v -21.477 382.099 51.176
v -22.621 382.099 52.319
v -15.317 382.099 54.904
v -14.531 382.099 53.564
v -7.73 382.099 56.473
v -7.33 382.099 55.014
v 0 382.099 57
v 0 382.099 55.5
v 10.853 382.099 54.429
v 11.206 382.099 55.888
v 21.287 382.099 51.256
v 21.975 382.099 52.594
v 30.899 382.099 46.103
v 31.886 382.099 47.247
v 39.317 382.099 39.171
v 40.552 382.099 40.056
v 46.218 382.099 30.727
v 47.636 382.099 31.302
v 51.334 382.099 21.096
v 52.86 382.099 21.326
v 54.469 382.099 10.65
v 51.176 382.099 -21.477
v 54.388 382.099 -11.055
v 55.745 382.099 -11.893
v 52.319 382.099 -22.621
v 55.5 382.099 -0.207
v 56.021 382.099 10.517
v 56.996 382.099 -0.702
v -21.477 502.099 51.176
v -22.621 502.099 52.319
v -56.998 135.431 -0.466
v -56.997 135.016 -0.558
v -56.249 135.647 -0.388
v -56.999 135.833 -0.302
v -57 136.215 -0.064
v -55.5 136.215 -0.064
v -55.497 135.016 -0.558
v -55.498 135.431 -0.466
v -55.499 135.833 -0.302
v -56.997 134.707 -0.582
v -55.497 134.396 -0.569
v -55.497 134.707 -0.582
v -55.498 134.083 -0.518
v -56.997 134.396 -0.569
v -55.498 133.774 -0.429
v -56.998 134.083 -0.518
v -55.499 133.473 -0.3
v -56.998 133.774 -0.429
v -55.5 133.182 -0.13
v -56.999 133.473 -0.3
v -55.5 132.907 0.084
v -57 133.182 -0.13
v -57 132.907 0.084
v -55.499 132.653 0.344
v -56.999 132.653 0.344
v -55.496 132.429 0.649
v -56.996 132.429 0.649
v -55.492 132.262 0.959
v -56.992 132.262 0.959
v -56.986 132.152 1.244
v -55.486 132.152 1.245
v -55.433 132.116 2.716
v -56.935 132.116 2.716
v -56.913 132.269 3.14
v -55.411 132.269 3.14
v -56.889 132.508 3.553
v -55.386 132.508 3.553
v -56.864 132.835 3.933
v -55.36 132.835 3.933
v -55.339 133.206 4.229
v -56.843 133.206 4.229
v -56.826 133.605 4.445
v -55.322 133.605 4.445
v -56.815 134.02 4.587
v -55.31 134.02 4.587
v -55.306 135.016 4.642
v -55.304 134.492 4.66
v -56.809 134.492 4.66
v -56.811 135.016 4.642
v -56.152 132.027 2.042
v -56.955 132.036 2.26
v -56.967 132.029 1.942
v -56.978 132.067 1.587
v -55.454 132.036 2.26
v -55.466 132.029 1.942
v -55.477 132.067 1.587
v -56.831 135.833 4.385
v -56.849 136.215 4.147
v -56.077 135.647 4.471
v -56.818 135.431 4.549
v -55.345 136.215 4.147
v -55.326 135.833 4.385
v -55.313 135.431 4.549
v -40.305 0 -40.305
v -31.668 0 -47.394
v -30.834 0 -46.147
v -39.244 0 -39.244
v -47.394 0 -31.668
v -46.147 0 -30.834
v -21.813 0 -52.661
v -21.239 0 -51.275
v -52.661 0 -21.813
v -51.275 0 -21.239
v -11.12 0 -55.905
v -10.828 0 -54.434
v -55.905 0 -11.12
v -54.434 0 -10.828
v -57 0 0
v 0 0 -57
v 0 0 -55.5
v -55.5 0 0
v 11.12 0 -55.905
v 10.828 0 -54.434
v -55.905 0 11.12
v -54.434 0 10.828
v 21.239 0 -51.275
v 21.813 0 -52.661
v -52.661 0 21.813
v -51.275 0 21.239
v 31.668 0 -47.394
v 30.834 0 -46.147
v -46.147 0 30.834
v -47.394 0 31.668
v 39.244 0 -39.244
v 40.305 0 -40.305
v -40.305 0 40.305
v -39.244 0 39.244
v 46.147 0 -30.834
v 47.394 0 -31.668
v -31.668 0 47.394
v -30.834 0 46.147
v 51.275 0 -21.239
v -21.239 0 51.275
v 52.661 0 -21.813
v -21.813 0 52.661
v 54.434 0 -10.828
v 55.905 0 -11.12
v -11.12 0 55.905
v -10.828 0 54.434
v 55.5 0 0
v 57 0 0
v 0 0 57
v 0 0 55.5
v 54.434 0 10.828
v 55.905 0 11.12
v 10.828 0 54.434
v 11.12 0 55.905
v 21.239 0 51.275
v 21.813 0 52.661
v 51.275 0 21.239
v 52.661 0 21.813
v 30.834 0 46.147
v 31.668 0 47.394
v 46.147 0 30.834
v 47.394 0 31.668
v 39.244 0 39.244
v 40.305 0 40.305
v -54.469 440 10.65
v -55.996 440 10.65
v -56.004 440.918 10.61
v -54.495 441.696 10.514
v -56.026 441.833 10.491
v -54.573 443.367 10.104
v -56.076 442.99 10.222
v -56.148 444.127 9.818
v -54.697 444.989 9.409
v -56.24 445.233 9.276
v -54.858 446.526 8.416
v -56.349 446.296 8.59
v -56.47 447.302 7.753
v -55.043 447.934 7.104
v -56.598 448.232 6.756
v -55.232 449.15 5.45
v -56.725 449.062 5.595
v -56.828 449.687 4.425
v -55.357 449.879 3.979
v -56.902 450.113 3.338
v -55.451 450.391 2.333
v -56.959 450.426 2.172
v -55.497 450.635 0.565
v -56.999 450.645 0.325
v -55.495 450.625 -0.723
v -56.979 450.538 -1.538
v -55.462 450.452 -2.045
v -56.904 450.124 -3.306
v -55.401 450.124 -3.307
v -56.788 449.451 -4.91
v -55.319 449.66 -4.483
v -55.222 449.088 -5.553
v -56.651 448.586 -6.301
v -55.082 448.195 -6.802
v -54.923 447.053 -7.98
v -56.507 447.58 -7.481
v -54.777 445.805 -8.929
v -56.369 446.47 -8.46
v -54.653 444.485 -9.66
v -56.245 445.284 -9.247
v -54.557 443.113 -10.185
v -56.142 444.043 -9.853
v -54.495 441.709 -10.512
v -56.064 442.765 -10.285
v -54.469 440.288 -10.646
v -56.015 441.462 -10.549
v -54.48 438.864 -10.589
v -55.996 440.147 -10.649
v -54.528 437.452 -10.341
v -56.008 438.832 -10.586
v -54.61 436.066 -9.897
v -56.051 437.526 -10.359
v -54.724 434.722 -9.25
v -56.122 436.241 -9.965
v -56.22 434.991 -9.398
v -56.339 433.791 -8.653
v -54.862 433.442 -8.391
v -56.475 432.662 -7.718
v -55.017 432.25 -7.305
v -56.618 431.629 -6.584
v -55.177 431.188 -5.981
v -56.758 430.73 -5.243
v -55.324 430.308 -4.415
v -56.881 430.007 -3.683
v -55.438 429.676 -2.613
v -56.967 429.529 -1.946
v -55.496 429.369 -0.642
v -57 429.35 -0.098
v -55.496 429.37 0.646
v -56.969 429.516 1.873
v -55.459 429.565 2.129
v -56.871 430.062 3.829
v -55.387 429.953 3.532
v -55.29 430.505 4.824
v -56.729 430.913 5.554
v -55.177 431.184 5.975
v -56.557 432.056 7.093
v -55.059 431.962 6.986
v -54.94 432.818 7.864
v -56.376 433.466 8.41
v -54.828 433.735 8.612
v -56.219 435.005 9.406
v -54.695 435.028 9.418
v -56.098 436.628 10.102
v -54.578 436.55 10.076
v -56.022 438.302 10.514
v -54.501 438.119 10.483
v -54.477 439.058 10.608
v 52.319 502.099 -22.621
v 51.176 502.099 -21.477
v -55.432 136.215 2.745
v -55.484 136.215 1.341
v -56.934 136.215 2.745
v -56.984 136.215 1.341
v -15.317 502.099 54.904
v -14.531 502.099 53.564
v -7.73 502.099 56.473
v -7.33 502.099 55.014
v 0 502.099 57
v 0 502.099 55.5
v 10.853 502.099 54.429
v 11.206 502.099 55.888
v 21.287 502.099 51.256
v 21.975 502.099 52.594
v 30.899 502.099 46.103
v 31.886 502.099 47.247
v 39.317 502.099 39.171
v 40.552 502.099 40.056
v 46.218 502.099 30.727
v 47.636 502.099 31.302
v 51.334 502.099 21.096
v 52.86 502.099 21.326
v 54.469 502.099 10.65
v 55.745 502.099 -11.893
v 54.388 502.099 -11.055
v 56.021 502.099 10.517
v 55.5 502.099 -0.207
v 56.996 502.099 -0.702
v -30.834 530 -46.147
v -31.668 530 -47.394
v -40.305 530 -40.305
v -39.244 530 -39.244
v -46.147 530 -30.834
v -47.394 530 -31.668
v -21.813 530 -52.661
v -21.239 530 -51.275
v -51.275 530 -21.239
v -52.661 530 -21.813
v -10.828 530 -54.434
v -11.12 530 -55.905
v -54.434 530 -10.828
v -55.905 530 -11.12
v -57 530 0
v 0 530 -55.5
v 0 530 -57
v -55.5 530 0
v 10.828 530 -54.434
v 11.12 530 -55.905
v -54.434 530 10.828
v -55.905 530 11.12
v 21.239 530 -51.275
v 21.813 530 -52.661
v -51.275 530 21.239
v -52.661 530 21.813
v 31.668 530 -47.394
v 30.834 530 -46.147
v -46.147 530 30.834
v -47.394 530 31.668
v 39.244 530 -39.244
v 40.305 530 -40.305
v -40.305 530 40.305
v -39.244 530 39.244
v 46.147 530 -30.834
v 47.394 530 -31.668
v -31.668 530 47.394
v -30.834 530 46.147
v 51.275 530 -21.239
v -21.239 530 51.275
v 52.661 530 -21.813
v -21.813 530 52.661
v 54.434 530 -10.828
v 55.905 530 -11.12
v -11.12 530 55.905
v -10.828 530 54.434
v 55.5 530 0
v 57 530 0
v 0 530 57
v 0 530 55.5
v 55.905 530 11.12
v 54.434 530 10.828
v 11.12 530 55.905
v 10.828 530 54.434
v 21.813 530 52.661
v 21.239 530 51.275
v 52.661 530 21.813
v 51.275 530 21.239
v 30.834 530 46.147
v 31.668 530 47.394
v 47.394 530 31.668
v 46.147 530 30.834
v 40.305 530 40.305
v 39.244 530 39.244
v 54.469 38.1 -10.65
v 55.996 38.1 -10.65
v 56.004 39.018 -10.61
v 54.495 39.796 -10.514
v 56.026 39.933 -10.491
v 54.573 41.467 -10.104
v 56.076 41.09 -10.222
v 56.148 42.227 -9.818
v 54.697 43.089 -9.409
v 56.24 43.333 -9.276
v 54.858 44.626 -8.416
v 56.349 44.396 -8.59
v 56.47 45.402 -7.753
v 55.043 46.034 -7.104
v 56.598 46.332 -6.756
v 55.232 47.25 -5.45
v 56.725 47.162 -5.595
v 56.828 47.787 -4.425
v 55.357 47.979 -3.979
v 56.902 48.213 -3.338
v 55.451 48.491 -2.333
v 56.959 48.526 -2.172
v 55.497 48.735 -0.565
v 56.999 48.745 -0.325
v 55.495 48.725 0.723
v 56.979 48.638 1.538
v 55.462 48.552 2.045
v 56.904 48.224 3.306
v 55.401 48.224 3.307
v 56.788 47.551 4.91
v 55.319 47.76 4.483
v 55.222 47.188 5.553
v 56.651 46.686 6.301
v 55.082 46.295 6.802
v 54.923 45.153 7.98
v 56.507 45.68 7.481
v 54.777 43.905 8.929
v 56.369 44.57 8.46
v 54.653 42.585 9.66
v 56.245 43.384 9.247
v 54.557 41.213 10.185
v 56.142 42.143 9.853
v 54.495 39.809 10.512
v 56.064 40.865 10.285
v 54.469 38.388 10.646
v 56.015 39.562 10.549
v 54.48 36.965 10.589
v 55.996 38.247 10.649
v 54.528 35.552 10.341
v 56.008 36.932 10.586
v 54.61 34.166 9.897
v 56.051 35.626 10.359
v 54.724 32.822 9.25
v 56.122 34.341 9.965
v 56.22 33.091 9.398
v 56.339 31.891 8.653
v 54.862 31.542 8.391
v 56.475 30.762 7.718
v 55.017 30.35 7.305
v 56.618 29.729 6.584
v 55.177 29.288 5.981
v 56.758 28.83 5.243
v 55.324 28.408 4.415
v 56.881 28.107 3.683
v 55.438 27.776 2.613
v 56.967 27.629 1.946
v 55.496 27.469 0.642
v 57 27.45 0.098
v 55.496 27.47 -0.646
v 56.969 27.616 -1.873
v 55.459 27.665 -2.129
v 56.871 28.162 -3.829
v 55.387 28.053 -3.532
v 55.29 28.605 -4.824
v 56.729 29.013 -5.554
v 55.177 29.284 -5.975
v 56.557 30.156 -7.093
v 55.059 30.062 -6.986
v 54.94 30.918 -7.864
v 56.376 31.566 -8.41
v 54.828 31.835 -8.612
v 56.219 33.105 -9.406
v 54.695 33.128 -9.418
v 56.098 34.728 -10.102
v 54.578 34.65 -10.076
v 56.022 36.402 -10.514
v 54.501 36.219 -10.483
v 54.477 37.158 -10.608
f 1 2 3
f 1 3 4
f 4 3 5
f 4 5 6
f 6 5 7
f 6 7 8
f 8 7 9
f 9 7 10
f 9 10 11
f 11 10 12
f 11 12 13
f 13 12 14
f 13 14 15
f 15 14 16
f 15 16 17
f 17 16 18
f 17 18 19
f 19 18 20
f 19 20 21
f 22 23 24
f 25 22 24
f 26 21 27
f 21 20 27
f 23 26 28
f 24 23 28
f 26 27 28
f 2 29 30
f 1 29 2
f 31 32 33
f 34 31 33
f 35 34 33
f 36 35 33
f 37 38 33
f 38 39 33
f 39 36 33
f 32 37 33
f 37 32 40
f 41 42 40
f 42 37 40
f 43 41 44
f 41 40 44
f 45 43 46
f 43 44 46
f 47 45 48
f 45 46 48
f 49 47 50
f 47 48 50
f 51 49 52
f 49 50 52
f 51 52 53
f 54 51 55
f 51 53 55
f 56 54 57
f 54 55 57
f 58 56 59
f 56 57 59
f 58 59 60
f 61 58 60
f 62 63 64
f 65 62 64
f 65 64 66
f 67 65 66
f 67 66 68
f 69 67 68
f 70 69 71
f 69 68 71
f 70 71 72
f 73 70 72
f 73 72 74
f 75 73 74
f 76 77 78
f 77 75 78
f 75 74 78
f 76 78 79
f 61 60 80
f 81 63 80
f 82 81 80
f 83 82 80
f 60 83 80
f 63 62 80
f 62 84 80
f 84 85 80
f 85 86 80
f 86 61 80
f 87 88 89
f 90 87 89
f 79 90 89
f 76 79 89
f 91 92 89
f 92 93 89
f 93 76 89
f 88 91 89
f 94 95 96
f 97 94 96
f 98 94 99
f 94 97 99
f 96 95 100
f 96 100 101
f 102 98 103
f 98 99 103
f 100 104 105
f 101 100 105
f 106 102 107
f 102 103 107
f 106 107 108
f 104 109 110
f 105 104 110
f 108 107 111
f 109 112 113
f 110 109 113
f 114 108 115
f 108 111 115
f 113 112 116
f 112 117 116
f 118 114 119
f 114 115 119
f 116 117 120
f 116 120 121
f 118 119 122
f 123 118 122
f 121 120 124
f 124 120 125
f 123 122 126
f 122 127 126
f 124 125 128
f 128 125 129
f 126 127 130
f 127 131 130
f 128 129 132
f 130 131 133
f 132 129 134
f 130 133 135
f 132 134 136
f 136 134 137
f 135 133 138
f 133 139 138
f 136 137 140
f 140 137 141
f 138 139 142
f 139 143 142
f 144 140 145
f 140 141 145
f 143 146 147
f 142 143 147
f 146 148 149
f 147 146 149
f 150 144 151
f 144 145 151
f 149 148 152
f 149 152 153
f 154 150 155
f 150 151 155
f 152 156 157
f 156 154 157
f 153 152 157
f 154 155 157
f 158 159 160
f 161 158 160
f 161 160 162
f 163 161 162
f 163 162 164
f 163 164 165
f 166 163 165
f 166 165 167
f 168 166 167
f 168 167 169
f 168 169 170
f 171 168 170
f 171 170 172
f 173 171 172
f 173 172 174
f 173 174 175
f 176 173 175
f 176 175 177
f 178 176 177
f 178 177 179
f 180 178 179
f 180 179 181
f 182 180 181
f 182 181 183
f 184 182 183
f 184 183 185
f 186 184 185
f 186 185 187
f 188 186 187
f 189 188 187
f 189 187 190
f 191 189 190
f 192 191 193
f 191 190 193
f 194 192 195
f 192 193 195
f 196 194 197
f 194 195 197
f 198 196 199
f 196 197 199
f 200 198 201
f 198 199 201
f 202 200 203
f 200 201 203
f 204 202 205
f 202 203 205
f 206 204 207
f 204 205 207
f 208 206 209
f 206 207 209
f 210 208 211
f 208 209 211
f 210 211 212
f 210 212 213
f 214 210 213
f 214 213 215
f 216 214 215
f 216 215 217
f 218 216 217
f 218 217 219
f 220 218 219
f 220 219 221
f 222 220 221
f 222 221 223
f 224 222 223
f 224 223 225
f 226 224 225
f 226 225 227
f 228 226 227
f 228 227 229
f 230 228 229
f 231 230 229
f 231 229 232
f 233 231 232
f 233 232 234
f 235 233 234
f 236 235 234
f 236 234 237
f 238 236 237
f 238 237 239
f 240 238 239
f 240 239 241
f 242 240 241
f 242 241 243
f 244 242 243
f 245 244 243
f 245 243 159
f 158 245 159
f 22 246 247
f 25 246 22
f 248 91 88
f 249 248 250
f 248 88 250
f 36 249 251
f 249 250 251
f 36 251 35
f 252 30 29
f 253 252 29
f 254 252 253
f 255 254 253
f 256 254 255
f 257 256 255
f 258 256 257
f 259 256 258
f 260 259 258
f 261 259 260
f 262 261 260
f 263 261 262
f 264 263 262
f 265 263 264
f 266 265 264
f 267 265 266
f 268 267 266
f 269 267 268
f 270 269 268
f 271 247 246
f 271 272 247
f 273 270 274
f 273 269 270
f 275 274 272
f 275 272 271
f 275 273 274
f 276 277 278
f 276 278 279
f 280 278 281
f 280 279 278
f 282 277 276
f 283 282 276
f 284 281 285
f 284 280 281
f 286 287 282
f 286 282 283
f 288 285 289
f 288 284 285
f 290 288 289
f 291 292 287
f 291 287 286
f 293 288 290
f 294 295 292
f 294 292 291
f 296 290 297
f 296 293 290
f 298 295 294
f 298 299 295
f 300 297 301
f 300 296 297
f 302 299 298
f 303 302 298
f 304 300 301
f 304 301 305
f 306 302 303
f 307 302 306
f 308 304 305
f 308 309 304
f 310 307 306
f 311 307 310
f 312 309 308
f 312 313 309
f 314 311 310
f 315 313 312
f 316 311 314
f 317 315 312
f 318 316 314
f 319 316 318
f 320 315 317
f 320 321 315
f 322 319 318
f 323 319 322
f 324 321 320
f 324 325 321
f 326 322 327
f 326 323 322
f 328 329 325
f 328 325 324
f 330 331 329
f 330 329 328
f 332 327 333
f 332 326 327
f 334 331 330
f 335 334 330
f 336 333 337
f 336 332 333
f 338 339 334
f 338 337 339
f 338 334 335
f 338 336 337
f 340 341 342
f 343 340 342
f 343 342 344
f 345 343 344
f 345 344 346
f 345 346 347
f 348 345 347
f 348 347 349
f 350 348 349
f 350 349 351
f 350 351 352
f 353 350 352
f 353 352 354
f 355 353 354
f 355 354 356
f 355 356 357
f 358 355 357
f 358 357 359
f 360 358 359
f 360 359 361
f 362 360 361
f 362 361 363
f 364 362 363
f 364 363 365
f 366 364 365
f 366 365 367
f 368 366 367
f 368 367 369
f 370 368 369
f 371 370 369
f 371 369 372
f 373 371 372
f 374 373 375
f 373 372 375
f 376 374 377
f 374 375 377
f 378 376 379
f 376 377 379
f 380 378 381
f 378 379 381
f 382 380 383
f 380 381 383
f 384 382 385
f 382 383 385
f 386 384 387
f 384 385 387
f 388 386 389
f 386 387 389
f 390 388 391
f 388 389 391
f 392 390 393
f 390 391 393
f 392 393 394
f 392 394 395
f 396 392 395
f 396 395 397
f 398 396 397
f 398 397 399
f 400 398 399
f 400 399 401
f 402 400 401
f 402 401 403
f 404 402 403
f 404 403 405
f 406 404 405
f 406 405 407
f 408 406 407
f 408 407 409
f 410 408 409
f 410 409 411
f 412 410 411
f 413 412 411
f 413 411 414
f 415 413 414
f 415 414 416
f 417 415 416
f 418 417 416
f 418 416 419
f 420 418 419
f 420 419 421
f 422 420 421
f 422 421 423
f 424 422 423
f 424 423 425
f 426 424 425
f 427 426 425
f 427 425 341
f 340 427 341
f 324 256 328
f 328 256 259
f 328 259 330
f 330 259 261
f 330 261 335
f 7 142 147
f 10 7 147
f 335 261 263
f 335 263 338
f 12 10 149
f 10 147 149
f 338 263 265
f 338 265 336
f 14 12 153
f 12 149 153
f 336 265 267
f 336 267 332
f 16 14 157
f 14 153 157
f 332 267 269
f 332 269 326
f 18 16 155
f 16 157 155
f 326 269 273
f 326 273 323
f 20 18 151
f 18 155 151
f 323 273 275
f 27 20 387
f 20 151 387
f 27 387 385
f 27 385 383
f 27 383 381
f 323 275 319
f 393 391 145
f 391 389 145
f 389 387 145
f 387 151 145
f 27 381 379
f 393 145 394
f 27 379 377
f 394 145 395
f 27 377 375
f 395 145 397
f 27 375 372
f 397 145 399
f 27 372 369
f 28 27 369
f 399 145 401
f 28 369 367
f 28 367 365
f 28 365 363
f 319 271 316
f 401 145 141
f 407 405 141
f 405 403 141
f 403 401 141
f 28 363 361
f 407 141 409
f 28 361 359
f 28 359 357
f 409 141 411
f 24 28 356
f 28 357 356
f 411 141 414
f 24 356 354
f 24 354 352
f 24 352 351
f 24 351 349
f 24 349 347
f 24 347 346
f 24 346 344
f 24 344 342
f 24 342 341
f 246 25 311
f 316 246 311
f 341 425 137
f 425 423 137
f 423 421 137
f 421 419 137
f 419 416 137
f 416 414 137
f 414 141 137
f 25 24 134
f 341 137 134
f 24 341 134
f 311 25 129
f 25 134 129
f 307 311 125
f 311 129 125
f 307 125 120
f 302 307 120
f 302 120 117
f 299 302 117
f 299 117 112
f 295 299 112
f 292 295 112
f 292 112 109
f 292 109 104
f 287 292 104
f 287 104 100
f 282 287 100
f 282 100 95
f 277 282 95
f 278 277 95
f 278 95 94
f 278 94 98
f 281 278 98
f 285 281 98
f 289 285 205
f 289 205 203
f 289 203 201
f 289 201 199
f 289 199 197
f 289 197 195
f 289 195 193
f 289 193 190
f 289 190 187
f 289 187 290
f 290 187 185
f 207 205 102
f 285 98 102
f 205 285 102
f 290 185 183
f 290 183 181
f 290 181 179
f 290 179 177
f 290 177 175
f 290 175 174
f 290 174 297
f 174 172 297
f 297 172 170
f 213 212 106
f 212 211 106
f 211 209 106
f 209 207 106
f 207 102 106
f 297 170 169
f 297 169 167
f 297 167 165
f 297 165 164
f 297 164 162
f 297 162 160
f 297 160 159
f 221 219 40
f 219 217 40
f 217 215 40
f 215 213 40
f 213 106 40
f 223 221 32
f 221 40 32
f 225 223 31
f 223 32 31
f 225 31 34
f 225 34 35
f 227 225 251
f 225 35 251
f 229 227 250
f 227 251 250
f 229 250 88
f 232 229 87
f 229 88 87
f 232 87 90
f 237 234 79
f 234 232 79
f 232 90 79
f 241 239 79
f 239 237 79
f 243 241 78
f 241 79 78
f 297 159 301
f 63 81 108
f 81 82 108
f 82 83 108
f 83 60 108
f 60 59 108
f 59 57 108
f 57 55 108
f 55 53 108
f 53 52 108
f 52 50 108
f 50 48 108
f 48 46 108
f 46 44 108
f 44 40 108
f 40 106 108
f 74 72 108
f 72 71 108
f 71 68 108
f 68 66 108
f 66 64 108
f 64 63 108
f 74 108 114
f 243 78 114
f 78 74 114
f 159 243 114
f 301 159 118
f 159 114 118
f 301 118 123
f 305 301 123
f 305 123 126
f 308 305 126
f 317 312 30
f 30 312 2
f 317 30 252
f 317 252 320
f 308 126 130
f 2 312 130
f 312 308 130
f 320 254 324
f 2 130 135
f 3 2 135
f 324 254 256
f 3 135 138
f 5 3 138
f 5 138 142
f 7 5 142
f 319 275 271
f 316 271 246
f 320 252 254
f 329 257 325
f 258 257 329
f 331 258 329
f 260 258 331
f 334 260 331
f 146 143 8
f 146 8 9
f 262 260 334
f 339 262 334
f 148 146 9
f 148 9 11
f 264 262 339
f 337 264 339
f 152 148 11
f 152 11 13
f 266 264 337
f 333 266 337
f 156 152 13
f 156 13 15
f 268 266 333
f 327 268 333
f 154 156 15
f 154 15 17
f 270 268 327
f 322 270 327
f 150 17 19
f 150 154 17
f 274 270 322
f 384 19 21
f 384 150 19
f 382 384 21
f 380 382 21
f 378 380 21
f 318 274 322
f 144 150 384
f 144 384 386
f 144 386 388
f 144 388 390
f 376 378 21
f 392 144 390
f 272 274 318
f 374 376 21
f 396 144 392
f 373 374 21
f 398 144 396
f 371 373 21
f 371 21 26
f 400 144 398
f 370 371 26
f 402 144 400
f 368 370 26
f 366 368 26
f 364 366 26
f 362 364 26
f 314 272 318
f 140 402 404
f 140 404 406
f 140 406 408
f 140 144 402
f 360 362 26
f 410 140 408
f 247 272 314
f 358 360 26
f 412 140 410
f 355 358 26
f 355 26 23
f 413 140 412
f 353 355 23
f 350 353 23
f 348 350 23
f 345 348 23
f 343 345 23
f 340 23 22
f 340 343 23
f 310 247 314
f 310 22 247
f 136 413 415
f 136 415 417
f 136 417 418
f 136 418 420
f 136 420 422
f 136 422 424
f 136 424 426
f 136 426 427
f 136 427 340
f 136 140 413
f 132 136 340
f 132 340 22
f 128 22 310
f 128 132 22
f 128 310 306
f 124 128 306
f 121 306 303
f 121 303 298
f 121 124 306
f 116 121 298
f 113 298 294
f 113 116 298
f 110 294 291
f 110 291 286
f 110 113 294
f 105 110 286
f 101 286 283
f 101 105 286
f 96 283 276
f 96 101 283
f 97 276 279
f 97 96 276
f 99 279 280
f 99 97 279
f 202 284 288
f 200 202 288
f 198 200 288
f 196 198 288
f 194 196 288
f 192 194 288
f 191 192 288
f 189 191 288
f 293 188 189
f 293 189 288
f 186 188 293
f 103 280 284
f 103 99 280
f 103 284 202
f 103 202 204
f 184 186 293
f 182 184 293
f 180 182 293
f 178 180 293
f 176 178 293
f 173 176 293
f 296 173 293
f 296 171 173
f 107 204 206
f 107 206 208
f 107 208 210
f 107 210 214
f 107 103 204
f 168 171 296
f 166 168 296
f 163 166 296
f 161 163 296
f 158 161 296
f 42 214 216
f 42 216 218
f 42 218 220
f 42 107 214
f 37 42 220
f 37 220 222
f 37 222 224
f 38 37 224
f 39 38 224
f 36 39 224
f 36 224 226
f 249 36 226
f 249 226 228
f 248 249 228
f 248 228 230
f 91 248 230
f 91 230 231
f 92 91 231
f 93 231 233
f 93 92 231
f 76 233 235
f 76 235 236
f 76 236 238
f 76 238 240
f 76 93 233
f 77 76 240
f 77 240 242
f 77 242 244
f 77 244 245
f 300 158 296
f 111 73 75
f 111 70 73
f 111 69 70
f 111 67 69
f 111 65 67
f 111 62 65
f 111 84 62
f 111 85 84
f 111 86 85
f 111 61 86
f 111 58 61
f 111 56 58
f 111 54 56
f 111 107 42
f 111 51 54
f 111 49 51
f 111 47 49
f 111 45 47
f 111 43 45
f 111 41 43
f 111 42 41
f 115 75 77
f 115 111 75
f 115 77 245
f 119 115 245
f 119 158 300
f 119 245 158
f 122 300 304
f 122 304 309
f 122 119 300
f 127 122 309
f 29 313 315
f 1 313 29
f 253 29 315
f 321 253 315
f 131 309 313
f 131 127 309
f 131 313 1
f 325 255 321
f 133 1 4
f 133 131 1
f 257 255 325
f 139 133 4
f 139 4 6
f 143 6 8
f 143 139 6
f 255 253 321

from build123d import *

# Parameters (mm, degrees)
CROQUIS1_R              = 57
CROQUIS1_R_2            = 55.5
SALIENTE_EXTRUIR1_DEPTH = 530
CROQUIS2_R              = 10.65
CORTAR_EXTRUIR1_DEPTH   = 10
CROQUIS3_R              = 10.65
CORTAR_EXTRUIR3_DEPTH   = 10
CROQUIS4_W              = 120
CROQUIS4_H              = 120
CORTAR_EXTRUIR4_DEPTH   = 36
CORTAR_EXTRUIR5_DEPTH   = 36


with BuildPart() as part:
    # Croquis1 → Saliente-Extruir1 (new body)
    with BuildSketch(Plane(origin=(0, 0, 0), x_dir=(1, 0, 0), z_dir=(0, 1, 0))):
        with Locations(Location((0, 0, 0), (0, 0, 270))):
            Circle(CROQUIS1_R)
        with Locations(Location((0, 0, 0), (0, 0, 270))):
            Circle(CROQUIS1_R_2, mode=Mode.SUBTRACT)
    extrude(amount=SALIENTE_EXTRUIR1_DEPTH)

    # Croquis2 → Cortar-Extruir1 (cut)
    with BuildSketch(Plane.ZY.offset(57)):
        with Locations((0, 440)):
            Circle(CROQUIS2_R)
    extrude(amount=-CORTAR_EXTRUIR1_DEPTH, mode=Mode.SUBTRACT)

    # Croquis3 → Cortar-Extruir3 (cut)
    with BuildSketch(Plane(origin=(57, 0, 0), x_dir=(0, 0, -1), z_dir=(1, 0, 0))):
        with Locations((0, 38.1)):
            Circle(CROQUIS3_R)
    extrude(amount=-CORTAR_EXTRUIR3_DEPTH, mode=Mode.SUBTRACT)

    # Croquis4 → Cortar-Extruir4 (cut)
    with BuildSketch(Plane(origin=(40.305086528, 0, 40.305086528), x_dir=(0, -1, 0), z_dir=(0.7071067811865464, 0, 0.7071067811865488))):
        with Locations((-442.099170551, 0)):
            Rectangle(CROQUIS4_W, CROQUIS4_H)
    extrude(amount=-CORTAR_EXTRUIR4_DEPTH, mode=Mode.SUBTRACT)

    # Croquis6 → Cortar-Extruir5 (cut)
    with BuildSketch(Plane.ZY.offset(57)):
        with BuildLine():
            Line((4.146980327, 136.214628742), (-0.063914709, 136.214628742))
            add(Edge.make_bspline(
                [(-0.063914709, 136.214628742), (-0.467287481, 135.678507753), (-0.558467191, 135.016456308)],
                knots=[5.643669724, 5.643669724, 5.643669724, 6.14786855, 6.14786855, 6.14786855], degree=2, weights=[1, 0.968390884, 1]))
            add(Edge.make_bspline(
                [(-0.558467191, 135.016456308), (-0.963914609, 132.027107364), (2.041532809, 132.027107364), (5.046980227, 132.027107364), (4.641532809, 135.016456308)],
                knots=[4.577072223, 4.577072223, 4.577072223, 6.283185307, 6.283185307, 7.989298391, 7.989298391, 7.989298391], degree=2, weights=[1, 0.657683746, 1, 0.657683746, 1]))
            add(Edge.make_bspline(
                [(4.641532809, 135.016456308), (4.550353099, 135.678507753), (4.146980327, 136.214628742)],
                knots=[3.276909411, 3.276909411, 3.276909411, 3.781108237, 3.781108237, 3.781108237], degree=2, weights=[1, 0.968390884, 1]))
        make_face()
    extrude(amount=-CORTAR_EXTRUIR5_DEPTH, mode=Mode.SUBTRACT)


solid = part.part
